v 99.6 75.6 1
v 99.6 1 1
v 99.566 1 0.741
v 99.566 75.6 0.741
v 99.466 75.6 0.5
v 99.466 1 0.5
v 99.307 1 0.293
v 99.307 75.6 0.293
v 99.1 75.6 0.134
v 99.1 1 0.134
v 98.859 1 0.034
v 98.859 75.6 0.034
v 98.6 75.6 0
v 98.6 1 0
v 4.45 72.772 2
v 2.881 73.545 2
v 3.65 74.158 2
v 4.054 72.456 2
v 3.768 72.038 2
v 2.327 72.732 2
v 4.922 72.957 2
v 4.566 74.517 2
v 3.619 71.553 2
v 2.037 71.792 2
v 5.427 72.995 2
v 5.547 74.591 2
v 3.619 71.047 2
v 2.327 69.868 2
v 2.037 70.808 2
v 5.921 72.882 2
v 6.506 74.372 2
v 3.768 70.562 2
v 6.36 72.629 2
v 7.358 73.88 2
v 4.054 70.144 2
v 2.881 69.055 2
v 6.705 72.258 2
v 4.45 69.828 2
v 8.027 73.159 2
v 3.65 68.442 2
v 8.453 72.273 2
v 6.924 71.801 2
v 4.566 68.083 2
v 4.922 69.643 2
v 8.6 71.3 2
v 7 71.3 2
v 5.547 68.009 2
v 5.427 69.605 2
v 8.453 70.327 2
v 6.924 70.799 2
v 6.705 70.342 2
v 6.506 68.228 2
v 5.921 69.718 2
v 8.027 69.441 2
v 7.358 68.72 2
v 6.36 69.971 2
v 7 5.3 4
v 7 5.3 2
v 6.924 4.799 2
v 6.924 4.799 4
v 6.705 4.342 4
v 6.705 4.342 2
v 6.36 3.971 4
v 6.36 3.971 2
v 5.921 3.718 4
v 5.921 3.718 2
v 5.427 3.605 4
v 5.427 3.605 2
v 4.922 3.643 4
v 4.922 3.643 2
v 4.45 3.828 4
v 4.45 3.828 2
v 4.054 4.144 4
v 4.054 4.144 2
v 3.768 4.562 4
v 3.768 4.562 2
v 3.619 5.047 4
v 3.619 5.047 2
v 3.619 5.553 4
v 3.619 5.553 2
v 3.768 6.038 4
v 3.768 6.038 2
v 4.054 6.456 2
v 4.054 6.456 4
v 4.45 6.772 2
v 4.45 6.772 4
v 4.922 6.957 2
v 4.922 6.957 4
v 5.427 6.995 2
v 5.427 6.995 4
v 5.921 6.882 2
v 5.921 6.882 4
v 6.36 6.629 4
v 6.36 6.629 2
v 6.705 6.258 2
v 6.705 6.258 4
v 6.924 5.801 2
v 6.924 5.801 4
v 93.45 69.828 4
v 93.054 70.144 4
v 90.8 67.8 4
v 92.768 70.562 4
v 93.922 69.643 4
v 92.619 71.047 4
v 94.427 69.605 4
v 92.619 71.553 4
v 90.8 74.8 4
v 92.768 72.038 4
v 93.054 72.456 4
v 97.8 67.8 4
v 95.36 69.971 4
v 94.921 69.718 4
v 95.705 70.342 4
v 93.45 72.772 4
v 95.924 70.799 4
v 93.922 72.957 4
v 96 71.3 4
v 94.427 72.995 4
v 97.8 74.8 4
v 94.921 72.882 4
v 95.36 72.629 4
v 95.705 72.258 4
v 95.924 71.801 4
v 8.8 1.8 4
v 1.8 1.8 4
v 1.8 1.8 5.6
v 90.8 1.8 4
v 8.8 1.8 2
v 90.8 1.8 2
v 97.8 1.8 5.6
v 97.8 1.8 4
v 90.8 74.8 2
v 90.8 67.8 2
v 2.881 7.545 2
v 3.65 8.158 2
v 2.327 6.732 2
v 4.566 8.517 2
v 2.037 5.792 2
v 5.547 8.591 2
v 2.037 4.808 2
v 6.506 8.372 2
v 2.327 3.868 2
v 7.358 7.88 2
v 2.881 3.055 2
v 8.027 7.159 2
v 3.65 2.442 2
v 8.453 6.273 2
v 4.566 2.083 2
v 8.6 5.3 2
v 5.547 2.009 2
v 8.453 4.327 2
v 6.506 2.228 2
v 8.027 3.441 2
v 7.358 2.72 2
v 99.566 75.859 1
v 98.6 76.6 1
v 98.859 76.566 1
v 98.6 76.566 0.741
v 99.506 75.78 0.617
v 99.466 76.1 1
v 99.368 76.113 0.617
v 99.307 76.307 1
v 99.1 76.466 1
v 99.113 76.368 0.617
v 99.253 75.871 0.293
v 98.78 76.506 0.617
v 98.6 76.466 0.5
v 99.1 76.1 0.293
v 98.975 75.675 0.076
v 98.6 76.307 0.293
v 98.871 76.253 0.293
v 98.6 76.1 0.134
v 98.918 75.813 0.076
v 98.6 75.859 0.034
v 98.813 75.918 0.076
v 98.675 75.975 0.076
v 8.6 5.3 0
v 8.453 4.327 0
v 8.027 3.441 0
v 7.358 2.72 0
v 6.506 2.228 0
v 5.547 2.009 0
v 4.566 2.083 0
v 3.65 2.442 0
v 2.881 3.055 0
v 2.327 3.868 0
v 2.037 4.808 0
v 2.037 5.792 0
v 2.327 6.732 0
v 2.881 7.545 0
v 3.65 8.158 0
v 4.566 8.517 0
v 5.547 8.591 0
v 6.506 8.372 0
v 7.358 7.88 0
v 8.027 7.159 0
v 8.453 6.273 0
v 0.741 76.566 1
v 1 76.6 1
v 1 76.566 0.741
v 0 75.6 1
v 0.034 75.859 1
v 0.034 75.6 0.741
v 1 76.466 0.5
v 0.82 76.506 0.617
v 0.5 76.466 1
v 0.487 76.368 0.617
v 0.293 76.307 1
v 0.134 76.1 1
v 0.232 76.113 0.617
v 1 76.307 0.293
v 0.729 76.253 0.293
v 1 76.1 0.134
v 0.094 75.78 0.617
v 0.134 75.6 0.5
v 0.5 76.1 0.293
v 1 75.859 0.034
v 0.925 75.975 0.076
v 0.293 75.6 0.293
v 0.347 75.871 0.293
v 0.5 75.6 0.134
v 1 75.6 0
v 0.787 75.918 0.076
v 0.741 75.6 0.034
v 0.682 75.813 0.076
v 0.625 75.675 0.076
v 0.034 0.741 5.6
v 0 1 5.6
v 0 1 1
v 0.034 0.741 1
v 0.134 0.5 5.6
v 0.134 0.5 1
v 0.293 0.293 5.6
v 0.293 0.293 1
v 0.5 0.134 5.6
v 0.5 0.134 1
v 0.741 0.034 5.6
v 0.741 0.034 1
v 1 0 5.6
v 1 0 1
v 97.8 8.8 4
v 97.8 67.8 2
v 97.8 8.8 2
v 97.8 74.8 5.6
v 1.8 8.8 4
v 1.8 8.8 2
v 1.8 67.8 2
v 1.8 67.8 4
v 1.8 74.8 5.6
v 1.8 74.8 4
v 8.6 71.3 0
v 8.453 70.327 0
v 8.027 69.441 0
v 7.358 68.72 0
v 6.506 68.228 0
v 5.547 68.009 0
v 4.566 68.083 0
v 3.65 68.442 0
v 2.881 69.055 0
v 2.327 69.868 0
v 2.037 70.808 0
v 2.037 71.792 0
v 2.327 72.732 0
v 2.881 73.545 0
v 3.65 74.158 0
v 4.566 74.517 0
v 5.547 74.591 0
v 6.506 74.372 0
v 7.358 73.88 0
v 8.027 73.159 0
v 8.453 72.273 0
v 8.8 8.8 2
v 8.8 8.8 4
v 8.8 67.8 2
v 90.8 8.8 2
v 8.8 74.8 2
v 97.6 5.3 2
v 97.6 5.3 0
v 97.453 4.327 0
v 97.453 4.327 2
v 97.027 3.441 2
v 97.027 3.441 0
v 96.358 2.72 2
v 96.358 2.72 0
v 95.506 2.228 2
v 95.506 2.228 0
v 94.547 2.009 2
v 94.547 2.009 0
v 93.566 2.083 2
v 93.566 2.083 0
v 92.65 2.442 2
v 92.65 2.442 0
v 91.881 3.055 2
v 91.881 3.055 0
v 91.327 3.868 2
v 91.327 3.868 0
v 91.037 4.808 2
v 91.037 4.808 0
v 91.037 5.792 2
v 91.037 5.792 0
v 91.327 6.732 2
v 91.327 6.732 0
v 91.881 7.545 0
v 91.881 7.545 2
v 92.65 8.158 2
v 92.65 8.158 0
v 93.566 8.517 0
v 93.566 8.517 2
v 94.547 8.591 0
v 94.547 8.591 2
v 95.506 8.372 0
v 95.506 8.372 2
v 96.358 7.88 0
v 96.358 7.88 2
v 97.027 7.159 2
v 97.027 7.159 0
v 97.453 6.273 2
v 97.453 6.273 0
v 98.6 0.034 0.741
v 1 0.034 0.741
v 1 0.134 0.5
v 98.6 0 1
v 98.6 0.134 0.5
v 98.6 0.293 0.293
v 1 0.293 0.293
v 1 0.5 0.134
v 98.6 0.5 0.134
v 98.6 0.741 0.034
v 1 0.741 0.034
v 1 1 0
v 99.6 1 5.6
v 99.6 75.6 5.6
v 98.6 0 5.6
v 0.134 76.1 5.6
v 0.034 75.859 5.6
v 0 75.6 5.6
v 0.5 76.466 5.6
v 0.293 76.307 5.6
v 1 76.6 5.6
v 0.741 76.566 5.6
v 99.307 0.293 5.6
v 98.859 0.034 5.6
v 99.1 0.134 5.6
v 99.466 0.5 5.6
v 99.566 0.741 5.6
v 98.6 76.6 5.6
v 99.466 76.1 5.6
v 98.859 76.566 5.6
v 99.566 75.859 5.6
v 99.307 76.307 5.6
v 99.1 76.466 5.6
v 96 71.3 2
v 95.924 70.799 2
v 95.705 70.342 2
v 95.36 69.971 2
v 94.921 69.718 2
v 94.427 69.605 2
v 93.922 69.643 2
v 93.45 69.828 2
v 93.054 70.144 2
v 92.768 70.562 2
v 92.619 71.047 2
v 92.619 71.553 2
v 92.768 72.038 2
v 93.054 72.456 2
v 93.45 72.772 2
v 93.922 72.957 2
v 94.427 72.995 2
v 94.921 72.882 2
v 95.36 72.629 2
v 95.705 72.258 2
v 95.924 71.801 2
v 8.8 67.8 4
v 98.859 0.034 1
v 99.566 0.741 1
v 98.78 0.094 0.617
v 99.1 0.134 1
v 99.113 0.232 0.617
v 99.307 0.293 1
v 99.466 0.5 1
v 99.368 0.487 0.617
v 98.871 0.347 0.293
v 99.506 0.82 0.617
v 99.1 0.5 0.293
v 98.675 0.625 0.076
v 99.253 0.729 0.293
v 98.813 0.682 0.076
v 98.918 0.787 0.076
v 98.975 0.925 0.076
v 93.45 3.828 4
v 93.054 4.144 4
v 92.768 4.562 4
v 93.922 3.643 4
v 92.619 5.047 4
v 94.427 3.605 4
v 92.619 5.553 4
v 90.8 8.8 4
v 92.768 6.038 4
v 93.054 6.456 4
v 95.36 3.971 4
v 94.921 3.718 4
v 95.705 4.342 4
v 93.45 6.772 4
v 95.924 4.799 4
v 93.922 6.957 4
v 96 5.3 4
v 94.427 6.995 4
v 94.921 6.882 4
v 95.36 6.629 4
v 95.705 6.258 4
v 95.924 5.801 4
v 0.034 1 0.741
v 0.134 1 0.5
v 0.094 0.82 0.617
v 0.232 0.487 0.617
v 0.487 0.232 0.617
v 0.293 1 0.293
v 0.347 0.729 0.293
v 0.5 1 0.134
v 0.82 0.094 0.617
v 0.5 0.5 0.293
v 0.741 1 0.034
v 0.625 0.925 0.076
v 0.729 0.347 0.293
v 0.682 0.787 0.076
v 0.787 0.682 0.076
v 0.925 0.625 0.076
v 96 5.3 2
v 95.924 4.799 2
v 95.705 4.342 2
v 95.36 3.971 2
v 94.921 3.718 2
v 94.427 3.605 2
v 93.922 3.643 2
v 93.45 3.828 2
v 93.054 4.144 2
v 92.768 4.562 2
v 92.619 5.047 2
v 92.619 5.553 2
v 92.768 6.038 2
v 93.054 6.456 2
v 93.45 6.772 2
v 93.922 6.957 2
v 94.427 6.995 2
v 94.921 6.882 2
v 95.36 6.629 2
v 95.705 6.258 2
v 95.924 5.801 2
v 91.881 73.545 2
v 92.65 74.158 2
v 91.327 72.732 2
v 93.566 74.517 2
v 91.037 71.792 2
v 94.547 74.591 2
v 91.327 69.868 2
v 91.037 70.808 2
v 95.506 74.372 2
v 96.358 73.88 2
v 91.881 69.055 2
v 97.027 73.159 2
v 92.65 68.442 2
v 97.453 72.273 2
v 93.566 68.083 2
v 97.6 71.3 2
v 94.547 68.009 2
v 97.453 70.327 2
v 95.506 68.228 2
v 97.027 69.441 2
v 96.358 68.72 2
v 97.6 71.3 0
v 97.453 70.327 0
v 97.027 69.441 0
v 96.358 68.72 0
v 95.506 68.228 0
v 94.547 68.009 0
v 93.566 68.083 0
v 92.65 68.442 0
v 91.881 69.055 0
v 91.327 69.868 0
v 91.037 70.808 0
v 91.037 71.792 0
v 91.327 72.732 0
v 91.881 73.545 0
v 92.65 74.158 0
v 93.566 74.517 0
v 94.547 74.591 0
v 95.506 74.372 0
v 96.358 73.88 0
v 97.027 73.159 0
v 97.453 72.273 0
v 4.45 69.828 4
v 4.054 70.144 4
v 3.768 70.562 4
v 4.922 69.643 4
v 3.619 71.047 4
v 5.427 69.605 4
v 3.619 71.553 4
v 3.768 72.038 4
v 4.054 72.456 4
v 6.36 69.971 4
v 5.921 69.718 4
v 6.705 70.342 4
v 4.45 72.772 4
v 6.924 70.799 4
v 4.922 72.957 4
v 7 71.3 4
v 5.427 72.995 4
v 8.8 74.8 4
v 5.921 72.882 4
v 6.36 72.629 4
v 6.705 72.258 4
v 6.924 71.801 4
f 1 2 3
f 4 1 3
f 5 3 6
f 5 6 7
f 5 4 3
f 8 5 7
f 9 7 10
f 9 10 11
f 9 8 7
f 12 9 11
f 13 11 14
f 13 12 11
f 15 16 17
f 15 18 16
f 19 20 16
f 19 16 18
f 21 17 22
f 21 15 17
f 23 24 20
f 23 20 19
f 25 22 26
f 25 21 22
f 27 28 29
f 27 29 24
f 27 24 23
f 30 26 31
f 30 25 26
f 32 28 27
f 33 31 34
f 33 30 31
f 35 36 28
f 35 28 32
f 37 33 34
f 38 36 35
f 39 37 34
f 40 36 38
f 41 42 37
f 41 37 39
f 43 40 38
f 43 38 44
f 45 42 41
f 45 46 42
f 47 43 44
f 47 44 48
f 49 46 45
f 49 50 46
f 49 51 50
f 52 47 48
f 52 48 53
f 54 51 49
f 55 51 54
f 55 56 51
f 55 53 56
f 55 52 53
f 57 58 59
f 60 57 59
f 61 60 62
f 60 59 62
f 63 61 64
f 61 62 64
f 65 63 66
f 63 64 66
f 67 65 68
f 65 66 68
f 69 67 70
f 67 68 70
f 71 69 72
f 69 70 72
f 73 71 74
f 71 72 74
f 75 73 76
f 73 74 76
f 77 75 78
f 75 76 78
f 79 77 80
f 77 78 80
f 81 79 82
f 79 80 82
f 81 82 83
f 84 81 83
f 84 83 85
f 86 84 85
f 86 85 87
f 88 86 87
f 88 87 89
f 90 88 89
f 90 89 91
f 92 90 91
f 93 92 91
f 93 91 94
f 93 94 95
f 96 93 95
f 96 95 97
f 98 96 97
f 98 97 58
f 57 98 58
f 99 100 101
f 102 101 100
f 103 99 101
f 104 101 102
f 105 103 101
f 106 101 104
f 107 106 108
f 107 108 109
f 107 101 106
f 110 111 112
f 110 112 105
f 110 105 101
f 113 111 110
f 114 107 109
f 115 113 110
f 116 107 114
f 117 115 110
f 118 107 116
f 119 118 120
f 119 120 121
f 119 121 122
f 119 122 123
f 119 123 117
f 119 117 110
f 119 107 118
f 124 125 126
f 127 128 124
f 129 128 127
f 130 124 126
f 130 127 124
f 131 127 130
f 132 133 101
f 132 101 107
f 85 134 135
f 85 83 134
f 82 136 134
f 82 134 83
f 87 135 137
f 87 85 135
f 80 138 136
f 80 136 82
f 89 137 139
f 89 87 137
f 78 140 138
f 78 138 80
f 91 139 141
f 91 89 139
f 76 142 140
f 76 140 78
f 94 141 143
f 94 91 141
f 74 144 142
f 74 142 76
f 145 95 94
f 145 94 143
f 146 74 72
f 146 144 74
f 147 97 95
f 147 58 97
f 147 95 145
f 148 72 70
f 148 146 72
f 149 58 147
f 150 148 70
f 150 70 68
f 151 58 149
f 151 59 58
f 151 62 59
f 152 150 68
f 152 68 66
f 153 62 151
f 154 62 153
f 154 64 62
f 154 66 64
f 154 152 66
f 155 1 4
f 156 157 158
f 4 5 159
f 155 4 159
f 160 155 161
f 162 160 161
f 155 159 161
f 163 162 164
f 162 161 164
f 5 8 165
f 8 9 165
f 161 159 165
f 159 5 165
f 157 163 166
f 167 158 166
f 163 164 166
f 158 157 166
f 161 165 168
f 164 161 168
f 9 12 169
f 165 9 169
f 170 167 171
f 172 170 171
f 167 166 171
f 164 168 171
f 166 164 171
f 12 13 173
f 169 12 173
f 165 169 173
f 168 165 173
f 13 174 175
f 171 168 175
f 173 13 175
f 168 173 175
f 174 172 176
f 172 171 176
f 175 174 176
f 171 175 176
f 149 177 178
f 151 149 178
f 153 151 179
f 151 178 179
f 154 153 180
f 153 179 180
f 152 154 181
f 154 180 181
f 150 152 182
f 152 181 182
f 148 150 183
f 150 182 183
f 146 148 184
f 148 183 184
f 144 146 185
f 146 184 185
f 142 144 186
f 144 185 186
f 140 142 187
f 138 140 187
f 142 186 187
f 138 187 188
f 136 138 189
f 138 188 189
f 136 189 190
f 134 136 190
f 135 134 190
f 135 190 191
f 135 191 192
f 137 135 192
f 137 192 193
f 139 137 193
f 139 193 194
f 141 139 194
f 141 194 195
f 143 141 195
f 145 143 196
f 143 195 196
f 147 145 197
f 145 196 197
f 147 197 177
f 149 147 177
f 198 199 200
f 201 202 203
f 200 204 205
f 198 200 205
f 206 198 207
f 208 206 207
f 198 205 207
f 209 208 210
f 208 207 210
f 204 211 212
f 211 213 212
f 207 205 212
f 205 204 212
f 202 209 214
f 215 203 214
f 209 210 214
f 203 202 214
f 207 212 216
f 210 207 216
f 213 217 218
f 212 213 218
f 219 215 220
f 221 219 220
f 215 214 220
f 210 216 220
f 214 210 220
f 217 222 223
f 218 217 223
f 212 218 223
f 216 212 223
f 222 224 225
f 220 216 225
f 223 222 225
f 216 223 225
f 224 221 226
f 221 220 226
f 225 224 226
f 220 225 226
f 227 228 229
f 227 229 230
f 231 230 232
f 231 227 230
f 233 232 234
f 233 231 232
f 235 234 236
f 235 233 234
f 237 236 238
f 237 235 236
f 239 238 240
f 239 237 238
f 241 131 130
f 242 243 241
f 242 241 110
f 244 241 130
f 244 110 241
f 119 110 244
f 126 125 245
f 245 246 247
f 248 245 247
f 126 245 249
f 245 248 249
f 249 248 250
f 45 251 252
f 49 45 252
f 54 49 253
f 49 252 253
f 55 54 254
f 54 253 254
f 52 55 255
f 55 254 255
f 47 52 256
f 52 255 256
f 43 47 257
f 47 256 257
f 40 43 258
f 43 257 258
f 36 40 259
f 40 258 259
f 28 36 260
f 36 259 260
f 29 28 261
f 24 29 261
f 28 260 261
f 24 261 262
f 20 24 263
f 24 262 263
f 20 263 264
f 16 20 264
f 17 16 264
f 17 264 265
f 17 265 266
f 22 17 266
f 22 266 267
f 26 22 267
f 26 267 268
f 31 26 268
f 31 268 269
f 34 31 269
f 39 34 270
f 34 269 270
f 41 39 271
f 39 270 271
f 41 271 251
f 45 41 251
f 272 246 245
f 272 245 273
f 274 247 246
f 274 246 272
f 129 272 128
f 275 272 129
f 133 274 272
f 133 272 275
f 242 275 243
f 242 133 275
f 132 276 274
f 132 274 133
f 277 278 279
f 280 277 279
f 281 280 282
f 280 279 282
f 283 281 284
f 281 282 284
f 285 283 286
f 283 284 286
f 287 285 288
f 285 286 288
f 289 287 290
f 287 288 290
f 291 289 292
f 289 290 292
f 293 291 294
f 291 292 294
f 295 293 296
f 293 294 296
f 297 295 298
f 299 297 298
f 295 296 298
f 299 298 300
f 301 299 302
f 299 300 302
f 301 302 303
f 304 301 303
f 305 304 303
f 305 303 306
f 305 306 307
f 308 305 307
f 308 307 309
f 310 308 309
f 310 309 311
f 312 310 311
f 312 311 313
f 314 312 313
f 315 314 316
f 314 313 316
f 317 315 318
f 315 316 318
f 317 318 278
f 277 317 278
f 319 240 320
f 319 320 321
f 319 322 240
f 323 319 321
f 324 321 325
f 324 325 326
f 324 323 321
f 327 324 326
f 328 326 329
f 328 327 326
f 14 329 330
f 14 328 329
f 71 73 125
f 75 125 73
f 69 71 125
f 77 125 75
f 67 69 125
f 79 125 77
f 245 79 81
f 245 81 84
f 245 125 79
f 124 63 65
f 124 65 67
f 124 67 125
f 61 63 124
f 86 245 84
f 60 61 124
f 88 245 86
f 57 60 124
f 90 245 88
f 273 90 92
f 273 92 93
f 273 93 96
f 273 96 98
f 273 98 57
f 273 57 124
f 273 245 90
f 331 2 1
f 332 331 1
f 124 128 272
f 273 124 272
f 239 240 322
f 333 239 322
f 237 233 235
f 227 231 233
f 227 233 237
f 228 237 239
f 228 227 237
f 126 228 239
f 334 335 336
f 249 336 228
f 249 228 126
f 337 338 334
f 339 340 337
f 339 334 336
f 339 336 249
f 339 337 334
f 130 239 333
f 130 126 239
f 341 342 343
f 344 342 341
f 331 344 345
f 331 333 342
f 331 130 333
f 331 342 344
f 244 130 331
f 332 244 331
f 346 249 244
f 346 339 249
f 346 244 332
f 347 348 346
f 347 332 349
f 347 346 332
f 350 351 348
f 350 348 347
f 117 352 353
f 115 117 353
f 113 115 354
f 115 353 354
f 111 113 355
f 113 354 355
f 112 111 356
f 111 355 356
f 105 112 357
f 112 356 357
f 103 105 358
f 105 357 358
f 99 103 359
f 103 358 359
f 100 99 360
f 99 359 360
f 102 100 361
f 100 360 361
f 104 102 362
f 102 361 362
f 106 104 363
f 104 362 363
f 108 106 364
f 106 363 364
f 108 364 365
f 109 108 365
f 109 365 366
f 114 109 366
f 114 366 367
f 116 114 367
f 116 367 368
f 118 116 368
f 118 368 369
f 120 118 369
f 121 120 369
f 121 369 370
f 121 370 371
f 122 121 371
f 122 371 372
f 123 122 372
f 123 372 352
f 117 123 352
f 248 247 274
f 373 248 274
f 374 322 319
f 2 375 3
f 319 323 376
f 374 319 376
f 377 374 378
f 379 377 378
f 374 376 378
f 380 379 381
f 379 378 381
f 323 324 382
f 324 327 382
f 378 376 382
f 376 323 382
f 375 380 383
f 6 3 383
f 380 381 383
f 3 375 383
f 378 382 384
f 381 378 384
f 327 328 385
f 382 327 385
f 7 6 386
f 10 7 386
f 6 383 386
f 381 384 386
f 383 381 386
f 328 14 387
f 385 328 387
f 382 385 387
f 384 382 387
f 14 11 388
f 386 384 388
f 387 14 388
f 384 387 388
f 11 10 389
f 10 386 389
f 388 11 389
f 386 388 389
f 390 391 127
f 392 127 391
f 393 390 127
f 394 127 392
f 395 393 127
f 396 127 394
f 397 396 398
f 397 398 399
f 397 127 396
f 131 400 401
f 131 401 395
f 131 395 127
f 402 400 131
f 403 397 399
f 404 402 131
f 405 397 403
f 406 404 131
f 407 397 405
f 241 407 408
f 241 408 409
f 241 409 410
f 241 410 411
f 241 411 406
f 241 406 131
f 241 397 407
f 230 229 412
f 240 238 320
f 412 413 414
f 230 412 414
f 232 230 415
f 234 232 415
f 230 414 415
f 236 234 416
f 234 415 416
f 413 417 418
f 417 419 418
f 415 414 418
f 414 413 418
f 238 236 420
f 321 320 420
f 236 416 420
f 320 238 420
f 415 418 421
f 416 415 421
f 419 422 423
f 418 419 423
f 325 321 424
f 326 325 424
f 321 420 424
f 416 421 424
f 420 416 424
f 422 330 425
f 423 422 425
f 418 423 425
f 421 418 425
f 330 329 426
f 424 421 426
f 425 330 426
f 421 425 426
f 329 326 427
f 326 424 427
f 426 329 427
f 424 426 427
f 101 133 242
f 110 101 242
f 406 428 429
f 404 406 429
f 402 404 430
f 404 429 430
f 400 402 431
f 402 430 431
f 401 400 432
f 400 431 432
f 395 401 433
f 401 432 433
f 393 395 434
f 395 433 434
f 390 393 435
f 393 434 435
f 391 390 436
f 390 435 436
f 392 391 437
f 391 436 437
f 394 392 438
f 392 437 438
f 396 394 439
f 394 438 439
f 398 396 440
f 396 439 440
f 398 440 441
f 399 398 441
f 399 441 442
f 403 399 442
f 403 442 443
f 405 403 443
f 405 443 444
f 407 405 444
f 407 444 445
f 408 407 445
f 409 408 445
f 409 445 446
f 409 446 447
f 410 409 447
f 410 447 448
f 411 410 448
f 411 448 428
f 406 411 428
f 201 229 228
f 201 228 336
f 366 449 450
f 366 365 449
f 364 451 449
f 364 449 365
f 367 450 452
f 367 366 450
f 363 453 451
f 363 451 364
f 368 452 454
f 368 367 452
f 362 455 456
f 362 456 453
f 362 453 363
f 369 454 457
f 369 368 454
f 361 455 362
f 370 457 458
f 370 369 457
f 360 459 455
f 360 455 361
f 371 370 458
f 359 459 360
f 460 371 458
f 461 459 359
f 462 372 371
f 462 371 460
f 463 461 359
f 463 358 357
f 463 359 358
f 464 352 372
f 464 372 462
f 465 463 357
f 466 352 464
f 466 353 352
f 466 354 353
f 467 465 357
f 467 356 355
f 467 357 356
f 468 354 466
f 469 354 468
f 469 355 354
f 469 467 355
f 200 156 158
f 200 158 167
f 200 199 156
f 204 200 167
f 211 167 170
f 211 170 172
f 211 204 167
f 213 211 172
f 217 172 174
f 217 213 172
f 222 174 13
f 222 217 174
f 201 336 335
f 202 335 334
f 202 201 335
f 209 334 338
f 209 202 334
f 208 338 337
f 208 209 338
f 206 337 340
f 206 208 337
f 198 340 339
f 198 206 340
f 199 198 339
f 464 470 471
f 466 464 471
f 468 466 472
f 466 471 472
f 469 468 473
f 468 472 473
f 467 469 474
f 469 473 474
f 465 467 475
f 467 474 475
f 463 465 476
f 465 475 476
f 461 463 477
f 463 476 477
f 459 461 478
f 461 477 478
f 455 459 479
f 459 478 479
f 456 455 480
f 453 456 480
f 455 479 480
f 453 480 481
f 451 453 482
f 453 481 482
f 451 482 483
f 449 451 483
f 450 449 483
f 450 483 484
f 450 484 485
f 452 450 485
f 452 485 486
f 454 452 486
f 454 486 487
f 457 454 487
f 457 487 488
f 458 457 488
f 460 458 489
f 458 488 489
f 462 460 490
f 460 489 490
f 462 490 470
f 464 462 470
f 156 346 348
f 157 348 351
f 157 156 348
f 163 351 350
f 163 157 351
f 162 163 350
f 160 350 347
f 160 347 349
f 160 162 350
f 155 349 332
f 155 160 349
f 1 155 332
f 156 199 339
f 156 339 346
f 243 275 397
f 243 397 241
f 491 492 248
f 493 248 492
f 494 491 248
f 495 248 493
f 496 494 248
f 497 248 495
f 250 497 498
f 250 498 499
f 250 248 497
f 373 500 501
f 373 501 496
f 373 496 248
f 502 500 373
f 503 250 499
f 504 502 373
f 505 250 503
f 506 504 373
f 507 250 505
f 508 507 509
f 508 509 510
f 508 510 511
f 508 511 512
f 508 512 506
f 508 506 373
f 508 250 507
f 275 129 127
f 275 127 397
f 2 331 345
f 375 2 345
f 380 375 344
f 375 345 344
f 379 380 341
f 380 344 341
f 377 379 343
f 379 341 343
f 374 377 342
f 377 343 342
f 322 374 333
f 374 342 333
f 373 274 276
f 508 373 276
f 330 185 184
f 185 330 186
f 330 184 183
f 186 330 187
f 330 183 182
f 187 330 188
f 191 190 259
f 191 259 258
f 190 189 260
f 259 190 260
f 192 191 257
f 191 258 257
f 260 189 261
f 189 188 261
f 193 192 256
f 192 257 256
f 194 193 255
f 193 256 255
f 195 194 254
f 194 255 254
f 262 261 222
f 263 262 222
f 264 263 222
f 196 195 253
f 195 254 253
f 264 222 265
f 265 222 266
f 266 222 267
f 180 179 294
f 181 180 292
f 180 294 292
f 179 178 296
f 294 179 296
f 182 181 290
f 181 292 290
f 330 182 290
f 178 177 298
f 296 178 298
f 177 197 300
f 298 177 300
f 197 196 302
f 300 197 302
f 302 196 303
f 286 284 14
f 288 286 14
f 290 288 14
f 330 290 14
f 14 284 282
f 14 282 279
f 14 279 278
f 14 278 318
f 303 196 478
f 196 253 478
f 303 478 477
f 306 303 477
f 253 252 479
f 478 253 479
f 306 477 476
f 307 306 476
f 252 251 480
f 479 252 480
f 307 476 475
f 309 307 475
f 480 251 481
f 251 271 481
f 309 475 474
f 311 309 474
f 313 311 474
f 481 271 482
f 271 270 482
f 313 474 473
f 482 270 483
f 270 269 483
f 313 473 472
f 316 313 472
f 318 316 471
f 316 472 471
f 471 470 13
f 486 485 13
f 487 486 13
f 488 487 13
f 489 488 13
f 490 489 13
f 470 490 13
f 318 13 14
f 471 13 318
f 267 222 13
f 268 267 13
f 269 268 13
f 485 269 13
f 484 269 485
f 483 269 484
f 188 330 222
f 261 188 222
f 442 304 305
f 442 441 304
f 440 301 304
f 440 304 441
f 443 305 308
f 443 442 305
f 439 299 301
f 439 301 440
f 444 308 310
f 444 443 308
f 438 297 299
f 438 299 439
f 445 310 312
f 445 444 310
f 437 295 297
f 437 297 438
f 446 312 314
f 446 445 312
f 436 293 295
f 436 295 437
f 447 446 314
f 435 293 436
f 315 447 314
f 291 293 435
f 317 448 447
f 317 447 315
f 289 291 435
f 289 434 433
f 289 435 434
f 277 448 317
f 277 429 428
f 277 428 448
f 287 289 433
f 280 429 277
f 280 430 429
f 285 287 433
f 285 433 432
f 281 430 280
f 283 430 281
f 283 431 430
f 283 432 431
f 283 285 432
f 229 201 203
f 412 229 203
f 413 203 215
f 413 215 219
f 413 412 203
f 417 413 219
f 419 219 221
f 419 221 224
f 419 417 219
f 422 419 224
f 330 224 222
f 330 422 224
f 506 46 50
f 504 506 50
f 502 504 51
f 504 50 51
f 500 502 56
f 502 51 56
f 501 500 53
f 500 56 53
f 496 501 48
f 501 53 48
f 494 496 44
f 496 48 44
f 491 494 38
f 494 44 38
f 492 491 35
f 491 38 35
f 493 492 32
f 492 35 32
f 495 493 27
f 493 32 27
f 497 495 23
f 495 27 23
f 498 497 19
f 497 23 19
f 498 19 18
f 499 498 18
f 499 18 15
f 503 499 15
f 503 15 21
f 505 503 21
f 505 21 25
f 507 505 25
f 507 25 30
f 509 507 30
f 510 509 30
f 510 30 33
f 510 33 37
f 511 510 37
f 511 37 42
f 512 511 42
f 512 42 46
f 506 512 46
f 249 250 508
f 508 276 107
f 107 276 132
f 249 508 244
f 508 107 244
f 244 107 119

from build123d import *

# Parameters (mm, degrees)
SKETCH_W        = 99.6
SKETCH_H        = 76.6
PAD_DEPTH       = 2
SKETCH001_W     = 99.6
SKETCH001_H     = 76.6
SKETCH001_W_2   = 96
SKETCH001_H_2   = 73
PAD001_DEPTH    = 3.6
SKETCH003_W     = 7
SKETCH003_H     = 7
PAD003_DEPTH    = 2
SKETCH004_R     = 3.3
POCKET_DEPTH    = 2
SKETCH005_R     = 1.7
POCKET001_DEPTH = 5
FILLET_R        = 1
FILLET001_R     = 1
FILLET002_R     = 1
FILLET003_R     = 1
FILLET004_R     = 1


with BuildPart() as part:
    # Sketch → Pad (new body)
    with BuildSketch(Plane.XY):
        with Locations((49.8, 38.3)):
            Rectangle(SKETCH_W, SKETCH_H)
    extrude(amount=PAD_DEPTH)

    # Sketch001 (on Face6 of Pad) → Pad001 (join)
    with BuildSketch(Plane.XY.offset(2)):
        with Locations((49.8, 38.3)):
            Rectangle(SKETCH001_W, SKETCH001_H)
        with Locations((49.8, 38.3)):
            Rectangle(SKETCH001_W_2, SKETCH001_H_2, mode=Mode.SUBTRACT)
    extrude(amount=PAD001_DEPTH)

    # Sketch003 (on Face15 of Pad001) → Pad003 (join)
    with BuildSketch(Plane.XY.offset(2)):
        with Locations((5.3, 5.3)):
            Rectangle(SKETCH003_W, SKETCH003_H)
        with Locations((5.3, 71.3)):
            Rectangle(SKETCH003_W, SKETCH003_H)
        with Locations((94.3, 71.3)):
            Rectangle(SKETCH003_W, SKETCH003_H)
        with Locations((94.3, 5.3)):
            Rectangle(SKETCH003_W, SKETCH003_H)
    extrude(amount=PAD003_DEPTH)

    # Sketch004 (on Face4 of Pad003) → Pocket (cut)
    with BuildSketch(Plane(origin=(0, 0, 0), x_dir=(1, 0, 0), z_dir=(0, 0, -1))):
        with Locations((5.3, -5.3)):
            Circle(SKETCH004_R)
        with Locations((94.3, -5.3)):
            Circle(SKETCH004_R)
        with Locations((5.3, -71.3)):
            Circle(SKETCH004_R)
        with Locations((94.3, -71.3)):
            Circle(SKETCH004_R)
    extrude(amount=-POCKET_DEPTH, mode=Mode.SUBTRACT)

    # Sketch005 (on Face4 of Pocket) → Pocket001 (cut)
    with BuildSketch(Plane(origin=(0, 0, 0), x_dir=(1, 0, 0), z_dir=(0, 0, -1))):
        with Locations((5.3, -5.3)):
            Circle(SKETCH005_R)
        with Locations((5.3, -71.3)):
            Circle(SKETCH005_R)
        with Locations((94.3, -71.3)):
            Circle(SKETCH005_R)
        with Locations((94.3, -5.3)):
            Circle(SKETCH005_R)
    extrude(amount=-POCKET001_DEPTH, mode=Mode.SUBTRACT)

    # Fillet
    fillet_edges = [part.edges().sort_by_distance(p)[0] for p in [
        (0, 76.6, 3.8),
    ]]
    fillet(fillet_edges, radius=FILLET_R)

    # Fillet001
    fillet001_edges = [part.edges().sort_by_distance(p)[0] for p in [
        (0, 0, 2.8),
    ]]
    fillet(fillet001_edges, radius=FILLET001_R)

    # Fillet002
    fillet002_edges = [part.edges().sort_by_distance(p)[0] for p in [
        (99.6, 76.6, 2.8),
    ]]
    fillet(fillet002_edges, radius=FILLET002_R)

    # Fillet003
    fillet003_edges = [part.edges().sort_by_distance(p)[0] for p in [
        (99.6, 0, 2.8),
    ]]
    fillet(fillet003_edges, radius=FILLET003_R)

    # Fillet004
    fillet004_edges = [part.edges().sort_by_distance(p)[0] for p in [
        (49.8, 0, 0),
    ]]
    fillet(fillet004_edges, radius=FILLET004_R)


solid = part.part
